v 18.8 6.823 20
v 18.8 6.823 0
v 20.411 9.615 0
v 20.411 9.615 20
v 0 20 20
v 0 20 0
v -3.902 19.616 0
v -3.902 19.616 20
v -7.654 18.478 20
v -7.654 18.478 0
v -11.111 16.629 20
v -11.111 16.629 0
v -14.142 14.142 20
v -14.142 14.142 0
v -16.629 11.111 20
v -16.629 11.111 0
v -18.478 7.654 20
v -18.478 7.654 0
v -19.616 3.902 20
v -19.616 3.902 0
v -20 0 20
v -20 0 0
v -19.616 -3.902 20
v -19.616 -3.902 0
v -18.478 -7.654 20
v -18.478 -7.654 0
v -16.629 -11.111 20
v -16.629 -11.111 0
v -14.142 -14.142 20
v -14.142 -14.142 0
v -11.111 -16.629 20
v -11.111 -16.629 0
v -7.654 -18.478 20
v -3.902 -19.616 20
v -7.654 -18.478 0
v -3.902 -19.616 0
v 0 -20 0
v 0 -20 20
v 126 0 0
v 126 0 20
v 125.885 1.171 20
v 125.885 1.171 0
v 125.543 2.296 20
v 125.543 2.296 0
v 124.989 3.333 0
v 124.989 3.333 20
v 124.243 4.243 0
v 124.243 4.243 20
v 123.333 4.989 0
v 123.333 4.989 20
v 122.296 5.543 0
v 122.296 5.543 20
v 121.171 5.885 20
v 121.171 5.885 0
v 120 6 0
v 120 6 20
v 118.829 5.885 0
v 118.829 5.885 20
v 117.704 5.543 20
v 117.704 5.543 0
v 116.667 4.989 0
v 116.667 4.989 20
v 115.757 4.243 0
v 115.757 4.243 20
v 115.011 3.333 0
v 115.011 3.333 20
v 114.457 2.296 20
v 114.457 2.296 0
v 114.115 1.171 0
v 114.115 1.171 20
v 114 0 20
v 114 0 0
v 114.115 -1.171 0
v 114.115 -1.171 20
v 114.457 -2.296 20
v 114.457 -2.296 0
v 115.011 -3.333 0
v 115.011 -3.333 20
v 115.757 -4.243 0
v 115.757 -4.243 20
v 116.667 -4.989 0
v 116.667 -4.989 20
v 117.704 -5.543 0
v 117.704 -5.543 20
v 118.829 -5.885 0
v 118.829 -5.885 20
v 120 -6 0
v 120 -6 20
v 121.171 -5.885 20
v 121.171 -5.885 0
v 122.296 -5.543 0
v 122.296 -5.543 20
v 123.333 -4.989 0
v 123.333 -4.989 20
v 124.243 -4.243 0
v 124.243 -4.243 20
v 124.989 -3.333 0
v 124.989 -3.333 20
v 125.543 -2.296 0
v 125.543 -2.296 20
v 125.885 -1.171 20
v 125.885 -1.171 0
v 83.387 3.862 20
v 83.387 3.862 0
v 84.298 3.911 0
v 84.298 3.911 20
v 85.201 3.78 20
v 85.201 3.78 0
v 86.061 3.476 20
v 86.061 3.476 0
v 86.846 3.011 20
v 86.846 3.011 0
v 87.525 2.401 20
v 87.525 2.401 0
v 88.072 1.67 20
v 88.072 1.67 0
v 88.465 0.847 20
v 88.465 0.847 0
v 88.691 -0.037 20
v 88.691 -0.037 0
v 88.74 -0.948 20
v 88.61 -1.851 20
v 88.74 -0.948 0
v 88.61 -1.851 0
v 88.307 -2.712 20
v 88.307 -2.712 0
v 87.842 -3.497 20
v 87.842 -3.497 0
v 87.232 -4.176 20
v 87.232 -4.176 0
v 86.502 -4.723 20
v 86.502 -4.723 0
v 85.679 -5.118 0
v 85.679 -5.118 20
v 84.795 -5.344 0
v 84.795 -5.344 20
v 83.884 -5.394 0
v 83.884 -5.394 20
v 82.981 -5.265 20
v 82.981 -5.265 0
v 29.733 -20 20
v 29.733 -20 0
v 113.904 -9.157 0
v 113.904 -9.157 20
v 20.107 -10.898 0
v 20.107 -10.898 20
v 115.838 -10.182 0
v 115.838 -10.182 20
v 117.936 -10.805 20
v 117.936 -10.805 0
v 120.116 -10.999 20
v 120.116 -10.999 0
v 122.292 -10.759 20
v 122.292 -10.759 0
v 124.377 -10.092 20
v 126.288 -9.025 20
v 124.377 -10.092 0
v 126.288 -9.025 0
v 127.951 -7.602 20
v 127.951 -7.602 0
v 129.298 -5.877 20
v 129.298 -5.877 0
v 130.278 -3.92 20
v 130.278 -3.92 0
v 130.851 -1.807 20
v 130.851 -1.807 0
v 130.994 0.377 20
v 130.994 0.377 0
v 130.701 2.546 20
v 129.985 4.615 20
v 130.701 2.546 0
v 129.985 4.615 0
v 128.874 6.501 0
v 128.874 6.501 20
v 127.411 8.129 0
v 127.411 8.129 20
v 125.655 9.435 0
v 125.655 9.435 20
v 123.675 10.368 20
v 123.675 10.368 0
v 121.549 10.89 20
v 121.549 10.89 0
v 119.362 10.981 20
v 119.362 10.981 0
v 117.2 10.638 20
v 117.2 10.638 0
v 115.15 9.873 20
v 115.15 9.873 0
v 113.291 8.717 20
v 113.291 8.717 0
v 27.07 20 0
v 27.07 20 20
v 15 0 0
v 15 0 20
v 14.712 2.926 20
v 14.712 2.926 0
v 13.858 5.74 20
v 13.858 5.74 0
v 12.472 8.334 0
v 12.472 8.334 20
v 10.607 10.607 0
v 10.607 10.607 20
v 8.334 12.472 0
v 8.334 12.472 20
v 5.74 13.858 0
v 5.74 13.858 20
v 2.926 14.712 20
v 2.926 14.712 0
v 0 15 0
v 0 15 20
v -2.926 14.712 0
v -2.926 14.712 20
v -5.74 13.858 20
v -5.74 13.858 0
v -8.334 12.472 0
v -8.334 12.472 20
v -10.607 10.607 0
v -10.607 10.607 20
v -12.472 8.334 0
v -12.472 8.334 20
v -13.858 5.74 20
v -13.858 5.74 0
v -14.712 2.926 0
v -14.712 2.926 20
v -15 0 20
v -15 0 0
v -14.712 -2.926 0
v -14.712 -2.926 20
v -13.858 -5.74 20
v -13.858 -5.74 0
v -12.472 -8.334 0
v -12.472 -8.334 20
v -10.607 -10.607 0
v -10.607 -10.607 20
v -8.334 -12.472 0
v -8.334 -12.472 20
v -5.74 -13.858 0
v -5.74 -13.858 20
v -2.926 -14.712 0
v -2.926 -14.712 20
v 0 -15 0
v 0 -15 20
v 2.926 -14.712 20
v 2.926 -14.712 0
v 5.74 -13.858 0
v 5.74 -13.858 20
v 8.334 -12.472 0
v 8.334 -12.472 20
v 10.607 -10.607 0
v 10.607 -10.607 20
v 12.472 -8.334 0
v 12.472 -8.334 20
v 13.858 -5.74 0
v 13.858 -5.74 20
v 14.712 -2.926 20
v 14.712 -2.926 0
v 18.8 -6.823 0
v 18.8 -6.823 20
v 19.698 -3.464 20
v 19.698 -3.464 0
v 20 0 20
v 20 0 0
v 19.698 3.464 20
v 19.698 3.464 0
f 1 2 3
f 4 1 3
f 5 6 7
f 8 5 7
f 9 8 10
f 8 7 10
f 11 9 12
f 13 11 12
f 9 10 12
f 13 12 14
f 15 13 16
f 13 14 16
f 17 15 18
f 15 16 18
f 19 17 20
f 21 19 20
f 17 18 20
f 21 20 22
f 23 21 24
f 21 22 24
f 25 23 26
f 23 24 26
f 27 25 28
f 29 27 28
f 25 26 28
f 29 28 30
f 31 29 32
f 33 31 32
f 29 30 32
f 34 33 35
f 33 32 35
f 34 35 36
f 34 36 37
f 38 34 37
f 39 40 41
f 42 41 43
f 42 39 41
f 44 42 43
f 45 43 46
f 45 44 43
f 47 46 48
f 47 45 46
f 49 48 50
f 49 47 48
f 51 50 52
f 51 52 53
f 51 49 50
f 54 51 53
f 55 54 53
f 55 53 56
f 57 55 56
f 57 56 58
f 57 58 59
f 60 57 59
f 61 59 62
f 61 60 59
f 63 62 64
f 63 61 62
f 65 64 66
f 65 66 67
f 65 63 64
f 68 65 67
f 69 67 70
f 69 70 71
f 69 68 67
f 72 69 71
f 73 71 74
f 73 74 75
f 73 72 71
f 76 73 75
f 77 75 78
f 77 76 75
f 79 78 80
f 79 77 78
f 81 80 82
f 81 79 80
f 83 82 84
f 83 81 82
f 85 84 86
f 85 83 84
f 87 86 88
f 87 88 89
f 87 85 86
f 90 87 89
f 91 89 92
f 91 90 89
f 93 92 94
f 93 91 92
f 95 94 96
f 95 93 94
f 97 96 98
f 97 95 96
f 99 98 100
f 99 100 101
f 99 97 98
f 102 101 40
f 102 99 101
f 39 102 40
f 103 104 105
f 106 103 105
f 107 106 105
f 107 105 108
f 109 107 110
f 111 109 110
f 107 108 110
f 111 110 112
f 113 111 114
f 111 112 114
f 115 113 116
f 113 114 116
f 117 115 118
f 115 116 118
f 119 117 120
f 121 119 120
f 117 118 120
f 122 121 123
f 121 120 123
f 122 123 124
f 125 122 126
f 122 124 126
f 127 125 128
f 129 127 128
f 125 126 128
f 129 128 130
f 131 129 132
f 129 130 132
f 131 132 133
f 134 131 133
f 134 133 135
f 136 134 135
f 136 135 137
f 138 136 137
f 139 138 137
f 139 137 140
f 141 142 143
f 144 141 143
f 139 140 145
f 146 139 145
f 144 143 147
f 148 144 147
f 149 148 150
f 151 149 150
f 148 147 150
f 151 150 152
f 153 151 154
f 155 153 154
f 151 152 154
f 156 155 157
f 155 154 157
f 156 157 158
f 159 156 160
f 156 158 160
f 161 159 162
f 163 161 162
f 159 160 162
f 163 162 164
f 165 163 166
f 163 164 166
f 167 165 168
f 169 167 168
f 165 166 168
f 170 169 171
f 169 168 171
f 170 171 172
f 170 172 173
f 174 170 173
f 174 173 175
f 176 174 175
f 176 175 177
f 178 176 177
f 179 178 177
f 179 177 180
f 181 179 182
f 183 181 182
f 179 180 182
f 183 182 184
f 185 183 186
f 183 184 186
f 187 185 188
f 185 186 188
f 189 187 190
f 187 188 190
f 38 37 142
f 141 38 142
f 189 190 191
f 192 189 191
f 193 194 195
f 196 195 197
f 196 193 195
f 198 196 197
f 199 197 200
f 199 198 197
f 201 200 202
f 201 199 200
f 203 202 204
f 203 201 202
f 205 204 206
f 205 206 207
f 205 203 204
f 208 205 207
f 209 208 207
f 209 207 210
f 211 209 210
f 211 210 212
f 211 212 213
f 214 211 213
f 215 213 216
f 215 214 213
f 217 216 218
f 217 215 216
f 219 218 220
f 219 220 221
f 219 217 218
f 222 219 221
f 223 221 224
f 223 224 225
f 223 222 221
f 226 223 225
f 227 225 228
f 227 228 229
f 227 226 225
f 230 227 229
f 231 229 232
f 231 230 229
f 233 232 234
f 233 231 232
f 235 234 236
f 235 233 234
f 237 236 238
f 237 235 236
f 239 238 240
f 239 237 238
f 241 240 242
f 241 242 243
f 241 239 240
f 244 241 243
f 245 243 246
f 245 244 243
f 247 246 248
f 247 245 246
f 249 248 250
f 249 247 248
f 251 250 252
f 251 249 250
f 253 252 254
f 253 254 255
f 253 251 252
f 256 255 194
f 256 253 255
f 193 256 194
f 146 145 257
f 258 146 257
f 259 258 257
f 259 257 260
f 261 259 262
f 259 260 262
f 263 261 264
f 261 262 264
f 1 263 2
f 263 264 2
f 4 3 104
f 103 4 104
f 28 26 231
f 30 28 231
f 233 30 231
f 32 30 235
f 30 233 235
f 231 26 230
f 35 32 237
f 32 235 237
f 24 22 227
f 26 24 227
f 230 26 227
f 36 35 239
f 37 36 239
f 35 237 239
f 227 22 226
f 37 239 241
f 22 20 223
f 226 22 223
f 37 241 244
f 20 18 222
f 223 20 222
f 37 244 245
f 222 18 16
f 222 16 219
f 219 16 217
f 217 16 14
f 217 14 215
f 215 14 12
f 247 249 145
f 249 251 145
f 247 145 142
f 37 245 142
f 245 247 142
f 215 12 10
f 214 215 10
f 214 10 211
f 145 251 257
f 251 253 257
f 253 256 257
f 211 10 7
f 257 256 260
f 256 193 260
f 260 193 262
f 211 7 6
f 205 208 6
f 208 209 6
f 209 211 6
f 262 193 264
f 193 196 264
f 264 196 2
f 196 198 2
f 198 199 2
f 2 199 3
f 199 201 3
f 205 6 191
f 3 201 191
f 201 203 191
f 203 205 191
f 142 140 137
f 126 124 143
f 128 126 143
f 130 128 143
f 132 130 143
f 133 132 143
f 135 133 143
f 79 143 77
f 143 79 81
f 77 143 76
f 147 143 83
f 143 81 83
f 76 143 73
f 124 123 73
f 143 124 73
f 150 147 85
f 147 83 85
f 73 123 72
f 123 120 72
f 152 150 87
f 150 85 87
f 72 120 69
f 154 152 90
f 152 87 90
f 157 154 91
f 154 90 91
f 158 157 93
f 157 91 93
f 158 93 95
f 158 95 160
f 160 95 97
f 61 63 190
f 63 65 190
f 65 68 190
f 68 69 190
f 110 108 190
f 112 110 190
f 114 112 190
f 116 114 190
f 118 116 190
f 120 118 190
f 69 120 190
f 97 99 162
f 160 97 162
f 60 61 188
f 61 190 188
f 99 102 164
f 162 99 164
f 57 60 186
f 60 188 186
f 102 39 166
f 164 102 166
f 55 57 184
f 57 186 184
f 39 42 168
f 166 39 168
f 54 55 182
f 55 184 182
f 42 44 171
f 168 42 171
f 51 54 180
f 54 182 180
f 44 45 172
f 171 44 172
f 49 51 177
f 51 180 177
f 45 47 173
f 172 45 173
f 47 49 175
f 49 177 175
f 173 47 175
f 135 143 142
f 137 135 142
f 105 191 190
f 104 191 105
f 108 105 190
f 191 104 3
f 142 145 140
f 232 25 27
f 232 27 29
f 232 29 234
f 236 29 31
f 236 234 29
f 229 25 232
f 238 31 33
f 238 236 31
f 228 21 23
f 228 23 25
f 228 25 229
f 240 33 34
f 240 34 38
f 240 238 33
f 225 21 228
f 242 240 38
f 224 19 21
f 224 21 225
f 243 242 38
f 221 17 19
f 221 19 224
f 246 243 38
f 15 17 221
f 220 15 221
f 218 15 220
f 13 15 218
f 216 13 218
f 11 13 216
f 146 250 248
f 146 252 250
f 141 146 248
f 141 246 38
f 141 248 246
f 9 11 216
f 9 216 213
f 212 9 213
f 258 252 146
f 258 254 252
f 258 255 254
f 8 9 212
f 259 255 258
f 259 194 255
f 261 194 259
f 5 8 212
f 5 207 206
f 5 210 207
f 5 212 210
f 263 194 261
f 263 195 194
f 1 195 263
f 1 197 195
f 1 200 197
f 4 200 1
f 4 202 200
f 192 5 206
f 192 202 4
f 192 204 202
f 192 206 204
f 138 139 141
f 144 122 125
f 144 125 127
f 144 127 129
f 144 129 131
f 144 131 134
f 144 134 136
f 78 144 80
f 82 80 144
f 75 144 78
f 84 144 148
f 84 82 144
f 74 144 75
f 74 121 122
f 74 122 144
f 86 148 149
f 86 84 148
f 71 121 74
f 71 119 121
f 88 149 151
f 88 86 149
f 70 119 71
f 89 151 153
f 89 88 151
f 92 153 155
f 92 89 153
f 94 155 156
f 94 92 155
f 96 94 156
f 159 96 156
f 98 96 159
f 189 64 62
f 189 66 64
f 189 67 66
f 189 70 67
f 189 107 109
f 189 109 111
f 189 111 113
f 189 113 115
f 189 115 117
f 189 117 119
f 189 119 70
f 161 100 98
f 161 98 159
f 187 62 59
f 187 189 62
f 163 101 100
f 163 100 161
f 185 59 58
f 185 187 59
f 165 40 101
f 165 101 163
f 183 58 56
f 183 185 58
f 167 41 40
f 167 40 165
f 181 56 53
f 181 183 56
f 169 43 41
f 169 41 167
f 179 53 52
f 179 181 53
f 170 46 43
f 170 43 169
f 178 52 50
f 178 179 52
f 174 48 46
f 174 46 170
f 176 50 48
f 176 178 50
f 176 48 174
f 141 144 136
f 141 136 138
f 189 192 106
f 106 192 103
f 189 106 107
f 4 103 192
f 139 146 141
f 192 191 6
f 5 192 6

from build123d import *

# Parameters (mm, degrees)
SZKIC2_R                    = 20
SZKIC2_R_2                  = 15
SZKIC2_R_3                  = 11
SZKIC2_R_4                  = 6
DODANIE_WYCI_GNI_CIE2_DEPTH = 20


with BuildPart() as part:
    # Szkic2 → Dodanie-wyciągnięcie2 (new body)
    with BuildSketch(Plane.XY):
        with BuildLine():
            ThreePointArc((18.800305478, -6.822647135), (11.479265162, -16.377621053), (0, -20))
            Line((0, -20), (29.733250719, -20))
            Line((29.733250719, -20), (113.904224342, -9.156501468))
            ThreePointArc((113.904224342, -9.156501468), (109.006471259, -0.377260954), (113.290863107, 8.71707991))
            Line((113.290863107, 8.71707991), (27.069867273, 20))
            Line((27.069867273, 20), (0, 20))
            ThreePointArc((0, 20), (11.479265162, 16.377621053), (18.800305478, 6.822647135))
            Line((18.800305478, 6.822647135), (20.410663052, 9.615363763))
            Line((20.410663052, 9.615363763), (83.386650307, 3.862118667))
            ThreePointArc((83.386650307, 3.862118667), (88.740074522, -0.948230099), (82.9809258, -5.26457254))
            Line((82.9809258, -5.26457254), (20.107259976, -10.897738547))
            Line((20.107259976, -10.897738547), (18.800305478, -6.822647135))
        make_face()
        Circle(SZKIC2_R)
        Circle(SZKIC2_R_2, mode=Mode.SUBTRACT)
        with Locations((120, 0)):
            Circle(SZKIC2_R_3)
        with Locations((120, 0)):
            Circle(SZKIC2_R_4, mode=Mode.SUBTRACT)
    extrude(amount=DODANIE_WYCI_GNI_CIE2_DEPTH)


solid = part.part
